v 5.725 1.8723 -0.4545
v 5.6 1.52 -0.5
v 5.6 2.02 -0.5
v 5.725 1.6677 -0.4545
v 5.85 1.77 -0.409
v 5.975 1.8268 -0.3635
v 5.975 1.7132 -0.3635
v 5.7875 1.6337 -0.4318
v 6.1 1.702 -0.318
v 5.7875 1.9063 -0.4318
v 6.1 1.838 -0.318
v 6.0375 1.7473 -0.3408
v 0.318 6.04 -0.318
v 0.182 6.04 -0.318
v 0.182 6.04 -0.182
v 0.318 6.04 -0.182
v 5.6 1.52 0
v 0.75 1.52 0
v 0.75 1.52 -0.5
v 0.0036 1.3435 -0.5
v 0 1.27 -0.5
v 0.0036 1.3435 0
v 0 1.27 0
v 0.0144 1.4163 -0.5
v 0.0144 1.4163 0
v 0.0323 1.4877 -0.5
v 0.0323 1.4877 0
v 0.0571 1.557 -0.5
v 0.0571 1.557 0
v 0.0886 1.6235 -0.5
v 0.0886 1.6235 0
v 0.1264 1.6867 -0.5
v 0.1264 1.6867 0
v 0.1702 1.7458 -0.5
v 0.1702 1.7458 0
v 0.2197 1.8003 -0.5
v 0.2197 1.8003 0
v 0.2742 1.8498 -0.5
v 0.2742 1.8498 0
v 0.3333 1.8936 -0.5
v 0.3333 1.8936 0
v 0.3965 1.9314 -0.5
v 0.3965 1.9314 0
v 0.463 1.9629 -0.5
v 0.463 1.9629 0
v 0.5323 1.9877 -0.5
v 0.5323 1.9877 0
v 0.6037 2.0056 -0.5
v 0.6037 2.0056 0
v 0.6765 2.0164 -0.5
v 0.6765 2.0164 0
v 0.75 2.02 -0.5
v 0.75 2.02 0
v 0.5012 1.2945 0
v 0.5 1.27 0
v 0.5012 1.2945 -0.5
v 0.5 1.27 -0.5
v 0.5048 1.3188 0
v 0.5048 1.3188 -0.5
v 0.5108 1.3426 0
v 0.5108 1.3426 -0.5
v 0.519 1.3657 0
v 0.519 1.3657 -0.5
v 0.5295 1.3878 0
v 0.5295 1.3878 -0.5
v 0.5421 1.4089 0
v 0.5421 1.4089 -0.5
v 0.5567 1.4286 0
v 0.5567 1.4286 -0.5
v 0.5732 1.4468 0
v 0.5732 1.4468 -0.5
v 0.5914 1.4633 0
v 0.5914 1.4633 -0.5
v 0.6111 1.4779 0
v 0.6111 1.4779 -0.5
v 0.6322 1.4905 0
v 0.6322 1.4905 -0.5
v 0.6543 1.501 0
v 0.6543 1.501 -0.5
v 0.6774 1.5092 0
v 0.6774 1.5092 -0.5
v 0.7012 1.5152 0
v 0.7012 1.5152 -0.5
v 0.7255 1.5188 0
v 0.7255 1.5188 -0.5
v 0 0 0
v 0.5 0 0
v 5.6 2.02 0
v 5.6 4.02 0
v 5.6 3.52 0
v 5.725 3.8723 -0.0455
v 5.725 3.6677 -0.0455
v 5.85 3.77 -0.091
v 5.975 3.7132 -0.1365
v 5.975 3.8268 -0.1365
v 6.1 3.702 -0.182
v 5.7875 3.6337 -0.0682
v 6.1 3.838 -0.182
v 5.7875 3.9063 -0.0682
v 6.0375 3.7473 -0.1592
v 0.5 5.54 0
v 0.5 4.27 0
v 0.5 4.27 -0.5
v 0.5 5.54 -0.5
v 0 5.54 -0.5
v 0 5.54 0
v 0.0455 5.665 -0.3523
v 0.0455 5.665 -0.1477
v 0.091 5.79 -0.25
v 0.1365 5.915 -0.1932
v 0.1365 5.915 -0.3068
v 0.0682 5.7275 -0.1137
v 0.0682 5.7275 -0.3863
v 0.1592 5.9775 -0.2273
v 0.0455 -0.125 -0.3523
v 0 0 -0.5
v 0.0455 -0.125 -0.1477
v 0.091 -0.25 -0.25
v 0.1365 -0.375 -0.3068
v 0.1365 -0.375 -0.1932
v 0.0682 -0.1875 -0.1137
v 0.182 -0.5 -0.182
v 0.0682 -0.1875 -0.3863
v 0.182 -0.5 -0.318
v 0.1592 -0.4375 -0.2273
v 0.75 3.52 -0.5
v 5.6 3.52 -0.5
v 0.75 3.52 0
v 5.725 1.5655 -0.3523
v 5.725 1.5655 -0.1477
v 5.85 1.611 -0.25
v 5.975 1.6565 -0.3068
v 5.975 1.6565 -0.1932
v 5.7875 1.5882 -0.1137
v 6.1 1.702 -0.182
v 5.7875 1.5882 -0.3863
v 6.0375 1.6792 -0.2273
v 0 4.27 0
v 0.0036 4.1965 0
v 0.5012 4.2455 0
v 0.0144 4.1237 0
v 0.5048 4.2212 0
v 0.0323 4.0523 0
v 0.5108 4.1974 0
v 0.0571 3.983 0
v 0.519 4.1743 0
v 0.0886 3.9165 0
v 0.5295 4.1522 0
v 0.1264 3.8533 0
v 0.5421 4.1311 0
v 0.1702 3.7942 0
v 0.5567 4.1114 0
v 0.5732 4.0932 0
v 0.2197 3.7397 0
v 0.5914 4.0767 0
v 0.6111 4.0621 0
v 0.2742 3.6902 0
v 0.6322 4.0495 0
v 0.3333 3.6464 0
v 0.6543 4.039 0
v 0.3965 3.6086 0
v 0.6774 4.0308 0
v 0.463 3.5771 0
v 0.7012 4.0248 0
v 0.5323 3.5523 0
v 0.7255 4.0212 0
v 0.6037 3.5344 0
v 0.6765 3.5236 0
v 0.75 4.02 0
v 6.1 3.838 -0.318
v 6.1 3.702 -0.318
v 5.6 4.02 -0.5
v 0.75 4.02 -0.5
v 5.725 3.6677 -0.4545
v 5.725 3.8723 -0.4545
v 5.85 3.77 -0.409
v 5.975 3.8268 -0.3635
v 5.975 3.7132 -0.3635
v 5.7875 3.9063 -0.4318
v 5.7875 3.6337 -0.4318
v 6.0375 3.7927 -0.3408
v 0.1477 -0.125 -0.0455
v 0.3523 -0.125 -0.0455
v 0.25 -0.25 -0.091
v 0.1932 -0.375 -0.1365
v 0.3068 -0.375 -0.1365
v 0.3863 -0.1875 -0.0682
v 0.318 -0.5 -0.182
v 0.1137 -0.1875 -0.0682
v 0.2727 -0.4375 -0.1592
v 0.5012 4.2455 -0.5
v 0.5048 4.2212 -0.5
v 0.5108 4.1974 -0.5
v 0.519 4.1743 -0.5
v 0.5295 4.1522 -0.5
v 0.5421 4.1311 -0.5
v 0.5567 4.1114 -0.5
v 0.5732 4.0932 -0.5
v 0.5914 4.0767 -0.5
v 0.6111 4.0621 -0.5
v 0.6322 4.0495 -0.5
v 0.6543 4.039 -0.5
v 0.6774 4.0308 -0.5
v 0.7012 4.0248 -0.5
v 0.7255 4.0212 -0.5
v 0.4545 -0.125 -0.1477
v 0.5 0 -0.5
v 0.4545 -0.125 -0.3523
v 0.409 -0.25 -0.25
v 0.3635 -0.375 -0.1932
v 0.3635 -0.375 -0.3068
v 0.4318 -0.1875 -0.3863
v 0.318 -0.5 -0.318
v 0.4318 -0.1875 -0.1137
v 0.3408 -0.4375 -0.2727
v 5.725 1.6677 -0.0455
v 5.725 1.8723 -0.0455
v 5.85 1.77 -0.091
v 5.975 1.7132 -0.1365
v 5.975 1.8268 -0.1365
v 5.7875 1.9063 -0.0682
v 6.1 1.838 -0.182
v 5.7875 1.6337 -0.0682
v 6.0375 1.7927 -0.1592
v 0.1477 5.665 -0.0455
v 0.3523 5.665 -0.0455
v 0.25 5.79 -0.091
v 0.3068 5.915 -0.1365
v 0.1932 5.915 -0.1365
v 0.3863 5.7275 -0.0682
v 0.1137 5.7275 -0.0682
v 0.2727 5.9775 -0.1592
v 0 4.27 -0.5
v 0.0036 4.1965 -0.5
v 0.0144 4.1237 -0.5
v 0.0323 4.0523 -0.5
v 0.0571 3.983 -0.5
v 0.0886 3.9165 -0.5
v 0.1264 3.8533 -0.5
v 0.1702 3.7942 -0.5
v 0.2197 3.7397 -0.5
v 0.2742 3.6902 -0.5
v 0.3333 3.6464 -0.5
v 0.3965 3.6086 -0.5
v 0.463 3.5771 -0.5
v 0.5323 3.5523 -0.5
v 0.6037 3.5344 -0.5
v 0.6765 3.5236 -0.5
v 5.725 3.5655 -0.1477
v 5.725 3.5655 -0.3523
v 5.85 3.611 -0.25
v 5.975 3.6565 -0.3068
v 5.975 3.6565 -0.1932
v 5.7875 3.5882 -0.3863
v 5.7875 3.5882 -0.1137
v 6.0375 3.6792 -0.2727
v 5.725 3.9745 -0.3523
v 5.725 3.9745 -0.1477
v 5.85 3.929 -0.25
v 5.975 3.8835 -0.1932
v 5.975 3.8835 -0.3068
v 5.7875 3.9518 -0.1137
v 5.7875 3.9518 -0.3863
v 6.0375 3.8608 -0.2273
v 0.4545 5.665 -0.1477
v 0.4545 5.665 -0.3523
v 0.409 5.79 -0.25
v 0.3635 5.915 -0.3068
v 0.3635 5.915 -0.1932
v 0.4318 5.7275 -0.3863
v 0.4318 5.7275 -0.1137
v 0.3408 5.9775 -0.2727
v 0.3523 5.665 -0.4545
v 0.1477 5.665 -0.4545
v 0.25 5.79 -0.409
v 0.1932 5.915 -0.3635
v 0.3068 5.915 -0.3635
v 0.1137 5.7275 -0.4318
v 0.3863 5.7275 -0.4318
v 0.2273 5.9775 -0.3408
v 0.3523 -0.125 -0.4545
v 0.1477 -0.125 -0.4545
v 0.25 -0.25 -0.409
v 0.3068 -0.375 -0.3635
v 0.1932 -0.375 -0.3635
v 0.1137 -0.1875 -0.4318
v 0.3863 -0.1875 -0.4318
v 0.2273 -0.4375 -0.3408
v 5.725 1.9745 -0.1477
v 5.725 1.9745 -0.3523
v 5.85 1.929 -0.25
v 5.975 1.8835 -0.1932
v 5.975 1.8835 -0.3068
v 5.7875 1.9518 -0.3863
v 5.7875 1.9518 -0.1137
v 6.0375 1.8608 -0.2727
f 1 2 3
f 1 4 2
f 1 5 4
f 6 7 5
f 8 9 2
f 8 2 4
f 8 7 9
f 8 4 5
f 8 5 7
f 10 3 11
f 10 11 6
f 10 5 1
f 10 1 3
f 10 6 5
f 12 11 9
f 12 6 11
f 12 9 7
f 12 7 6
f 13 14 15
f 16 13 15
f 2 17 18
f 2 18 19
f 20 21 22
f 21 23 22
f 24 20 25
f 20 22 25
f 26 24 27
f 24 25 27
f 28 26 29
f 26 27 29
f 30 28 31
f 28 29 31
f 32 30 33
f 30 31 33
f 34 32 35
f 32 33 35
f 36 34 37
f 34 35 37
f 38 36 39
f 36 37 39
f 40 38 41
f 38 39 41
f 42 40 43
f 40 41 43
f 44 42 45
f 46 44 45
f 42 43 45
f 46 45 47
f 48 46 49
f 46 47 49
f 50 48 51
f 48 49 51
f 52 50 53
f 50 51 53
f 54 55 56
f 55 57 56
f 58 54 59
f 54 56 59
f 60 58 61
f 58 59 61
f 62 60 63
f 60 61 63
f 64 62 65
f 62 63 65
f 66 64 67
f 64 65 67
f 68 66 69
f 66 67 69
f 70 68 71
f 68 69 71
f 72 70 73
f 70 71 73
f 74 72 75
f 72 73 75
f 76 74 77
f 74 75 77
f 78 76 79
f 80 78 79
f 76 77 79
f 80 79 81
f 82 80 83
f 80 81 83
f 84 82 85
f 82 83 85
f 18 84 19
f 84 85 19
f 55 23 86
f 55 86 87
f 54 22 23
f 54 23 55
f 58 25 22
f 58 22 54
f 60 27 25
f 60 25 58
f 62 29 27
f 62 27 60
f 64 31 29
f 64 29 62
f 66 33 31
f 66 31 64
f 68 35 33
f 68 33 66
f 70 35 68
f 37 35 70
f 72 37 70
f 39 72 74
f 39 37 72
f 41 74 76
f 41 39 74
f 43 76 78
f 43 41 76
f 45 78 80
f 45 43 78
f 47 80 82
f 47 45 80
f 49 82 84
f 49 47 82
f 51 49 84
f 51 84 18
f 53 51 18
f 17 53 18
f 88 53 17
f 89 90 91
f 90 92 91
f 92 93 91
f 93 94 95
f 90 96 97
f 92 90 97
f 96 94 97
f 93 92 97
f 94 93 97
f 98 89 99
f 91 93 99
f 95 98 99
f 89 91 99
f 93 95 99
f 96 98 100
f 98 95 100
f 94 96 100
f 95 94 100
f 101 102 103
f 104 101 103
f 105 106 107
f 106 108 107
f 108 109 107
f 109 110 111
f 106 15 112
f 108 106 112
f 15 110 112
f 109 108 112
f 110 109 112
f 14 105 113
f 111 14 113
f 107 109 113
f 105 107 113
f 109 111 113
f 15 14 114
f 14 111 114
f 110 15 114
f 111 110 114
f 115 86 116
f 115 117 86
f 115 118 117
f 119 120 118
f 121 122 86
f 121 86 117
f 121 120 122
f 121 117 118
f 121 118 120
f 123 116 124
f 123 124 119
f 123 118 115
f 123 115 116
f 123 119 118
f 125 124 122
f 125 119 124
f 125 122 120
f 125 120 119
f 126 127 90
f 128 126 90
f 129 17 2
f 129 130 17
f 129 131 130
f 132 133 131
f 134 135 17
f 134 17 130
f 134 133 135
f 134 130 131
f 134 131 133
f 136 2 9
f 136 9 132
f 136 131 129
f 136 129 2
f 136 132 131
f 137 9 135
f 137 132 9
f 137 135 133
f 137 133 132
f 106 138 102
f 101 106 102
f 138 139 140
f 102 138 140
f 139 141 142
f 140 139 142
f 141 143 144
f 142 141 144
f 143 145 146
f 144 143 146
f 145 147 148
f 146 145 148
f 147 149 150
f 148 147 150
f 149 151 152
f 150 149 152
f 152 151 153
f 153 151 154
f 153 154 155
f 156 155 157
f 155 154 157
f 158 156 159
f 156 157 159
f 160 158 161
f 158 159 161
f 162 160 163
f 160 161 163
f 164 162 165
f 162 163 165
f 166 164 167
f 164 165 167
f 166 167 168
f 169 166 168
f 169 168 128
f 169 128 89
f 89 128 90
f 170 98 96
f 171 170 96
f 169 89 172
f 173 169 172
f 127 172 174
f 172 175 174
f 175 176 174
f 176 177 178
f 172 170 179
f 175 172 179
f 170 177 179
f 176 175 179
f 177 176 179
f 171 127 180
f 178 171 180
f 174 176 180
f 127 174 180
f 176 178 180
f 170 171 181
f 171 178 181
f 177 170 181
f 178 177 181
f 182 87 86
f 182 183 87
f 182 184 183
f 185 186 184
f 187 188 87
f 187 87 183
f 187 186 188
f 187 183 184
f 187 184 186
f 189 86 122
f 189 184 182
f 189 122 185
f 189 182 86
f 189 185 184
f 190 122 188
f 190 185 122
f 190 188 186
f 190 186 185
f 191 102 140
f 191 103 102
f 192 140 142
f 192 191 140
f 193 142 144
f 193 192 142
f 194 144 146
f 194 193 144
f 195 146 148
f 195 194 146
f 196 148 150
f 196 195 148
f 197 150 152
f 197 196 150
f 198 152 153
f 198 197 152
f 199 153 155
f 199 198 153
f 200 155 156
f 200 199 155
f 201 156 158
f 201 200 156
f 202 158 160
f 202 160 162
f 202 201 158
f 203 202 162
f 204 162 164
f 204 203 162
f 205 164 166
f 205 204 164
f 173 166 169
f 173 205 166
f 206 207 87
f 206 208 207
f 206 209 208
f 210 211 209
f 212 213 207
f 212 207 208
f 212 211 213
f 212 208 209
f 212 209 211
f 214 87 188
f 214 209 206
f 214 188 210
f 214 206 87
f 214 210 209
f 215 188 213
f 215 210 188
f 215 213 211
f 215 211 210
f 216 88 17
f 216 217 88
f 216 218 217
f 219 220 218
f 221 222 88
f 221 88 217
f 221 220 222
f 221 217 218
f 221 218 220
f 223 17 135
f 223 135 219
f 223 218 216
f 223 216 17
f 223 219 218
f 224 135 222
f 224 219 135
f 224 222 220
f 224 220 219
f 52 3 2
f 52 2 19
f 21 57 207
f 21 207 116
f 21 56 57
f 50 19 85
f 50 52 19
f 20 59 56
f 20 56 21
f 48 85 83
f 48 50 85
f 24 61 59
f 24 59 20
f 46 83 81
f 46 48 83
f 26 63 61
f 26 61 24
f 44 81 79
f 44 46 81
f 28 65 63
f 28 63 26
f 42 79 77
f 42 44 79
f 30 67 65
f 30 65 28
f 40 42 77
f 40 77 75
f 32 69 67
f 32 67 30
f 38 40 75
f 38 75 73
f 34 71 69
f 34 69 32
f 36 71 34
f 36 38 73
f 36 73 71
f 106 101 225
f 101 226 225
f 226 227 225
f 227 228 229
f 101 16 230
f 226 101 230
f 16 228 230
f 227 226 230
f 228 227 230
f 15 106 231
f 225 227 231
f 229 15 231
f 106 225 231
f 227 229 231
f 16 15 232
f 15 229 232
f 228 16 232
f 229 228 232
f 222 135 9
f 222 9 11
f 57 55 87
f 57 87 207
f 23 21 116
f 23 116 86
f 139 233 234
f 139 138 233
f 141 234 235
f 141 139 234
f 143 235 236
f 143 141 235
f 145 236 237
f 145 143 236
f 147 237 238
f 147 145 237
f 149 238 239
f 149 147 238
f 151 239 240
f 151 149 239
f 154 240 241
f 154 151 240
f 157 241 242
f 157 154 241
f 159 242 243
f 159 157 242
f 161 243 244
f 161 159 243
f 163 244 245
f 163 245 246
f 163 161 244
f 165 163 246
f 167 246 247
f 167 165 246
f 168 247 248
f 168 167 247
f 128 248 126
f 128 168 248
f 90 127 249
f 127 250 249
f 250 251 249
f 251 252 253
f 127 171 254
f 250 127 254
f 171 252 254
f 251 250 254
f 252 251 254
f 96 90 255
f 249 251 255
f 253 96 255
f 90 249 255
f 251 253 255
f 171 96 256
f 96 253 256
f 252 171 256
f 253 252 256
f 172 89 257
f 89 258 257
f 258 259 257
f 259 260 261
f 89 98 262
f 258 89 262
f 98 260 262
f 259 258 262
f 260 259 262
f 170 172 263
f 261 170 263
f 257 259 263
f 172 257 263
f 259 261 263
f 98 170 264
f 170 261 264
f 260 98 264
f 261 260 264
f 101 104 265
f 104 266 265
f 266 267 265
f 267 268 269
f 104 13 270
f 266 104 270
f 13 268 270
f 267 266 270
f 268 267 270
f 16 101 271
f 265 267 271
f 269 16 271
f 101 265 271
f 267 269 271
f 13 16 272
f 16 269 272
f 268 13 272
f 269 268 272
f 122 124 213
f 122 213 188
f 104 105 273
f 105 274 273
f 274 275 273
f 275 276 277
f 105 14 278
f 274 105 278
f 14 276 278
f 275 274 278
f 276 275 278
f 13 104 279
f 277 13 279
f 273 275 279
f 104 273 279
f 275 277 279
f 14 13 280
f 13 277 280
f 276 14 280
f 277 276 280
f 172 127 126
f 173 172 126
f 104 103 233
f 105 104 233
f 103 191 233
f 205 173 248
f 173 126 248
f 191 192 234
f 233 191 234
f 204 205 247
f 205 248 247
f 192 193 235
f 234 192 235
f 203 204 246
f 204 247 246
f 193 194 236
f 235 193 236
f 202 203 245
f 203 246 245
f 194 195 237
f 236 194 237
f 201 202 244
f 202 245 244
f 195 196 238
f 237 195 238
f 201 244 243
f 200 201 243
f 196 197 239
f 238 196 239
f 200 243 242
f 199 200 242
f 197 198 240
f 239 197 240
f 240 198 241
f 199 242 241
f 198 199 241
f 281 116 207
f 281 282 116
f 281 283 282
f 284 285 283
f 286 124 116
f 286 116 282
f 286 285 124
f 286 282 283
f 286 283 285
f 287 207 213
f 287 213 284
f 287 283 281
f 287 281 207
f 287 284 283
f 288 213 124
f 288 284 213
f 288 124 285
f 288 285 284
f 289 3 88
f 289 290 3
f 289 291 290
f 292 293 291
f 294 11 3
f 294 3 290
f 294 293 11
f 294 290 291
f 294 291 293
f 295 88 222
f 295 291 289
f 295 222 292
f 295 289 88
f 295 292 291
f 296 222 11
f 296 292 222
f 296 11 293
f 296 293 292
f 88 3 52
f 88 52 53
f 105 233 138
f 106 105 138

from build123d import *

# Parameters (mm, degrees)
SKETCH1_W           = 0.5
SKETCH1_H           = 0.5
SKETCH6_W           = 0.5
SKETCH6_H           = 0.5
BOSS_EXTRUDE1_DEPTH = 0.5
BOSS_EXTRUDE1_TAPER = 20
SKETCH7_W           = 0.5
SKETCH7_H           = 0.5
BOSS_EXTRUDE2_DEPTH = 0.5
BOSS_EXTRUDE2_TAPER = 20


with BuildPart() as part:
    # Sweep4: sweep along a path in Sketch2
    with BuildLine(Plane.XY) as sweep4_path:
        Line((0.25, 0), (0.25, 1.27))
        ThreePointArc((0.25, 1.27), (0.396446609, 1.623553391), (0.75, 1.77))
        Line((0.75, 1.77), (5.6, 1.77))
    # Sketch1 → Sweep4 (sweep)
    with BuildSketch(Plane(origin=(0, 0, 0), x_dir=(1, 0, 0), z_dir=(0, 1, 0))):
        with Locations((0.25, 0.25)):
            Rectangle(SKETCH1_W, SKETCH1_H)
    sweep(path=sweep4_path.line)

    # Sketch6 → Boss-Extrude1 (add)
    with BuildSketch(Plane(origin=(5.6, 0, 0), x_dir=(0, 0, -1), z_dir=(1, 0, 0))):
        with Locations((0.25, 1.77)):
            Rectangle(SKETCH6_W, SKETCH6_H)
    extrude(amount=BOSS_EXTRUDE1_DEPTH, taper=BOSS_EXTRUDE1_TAPER)

    # Sketch7 → Boss-Extrude2 (add)
    with BuildSketch(Plane.XZ):
        with Locations((0.25, -0.25)):
            Rectangle(SKETCH7_W, SKETCH7_H)
    extrude(amount=BOSS_EXTRUDE2_DEPTH, taper=BOSS_EXTRUDE2_TAPER)


with BuildPart() as body_2:
    # Mirror3: mirrored copy
    add(part.part.mirror(Plane.ZX.offset(2.77)))


solid = Compound([part.part, body_2.part])
